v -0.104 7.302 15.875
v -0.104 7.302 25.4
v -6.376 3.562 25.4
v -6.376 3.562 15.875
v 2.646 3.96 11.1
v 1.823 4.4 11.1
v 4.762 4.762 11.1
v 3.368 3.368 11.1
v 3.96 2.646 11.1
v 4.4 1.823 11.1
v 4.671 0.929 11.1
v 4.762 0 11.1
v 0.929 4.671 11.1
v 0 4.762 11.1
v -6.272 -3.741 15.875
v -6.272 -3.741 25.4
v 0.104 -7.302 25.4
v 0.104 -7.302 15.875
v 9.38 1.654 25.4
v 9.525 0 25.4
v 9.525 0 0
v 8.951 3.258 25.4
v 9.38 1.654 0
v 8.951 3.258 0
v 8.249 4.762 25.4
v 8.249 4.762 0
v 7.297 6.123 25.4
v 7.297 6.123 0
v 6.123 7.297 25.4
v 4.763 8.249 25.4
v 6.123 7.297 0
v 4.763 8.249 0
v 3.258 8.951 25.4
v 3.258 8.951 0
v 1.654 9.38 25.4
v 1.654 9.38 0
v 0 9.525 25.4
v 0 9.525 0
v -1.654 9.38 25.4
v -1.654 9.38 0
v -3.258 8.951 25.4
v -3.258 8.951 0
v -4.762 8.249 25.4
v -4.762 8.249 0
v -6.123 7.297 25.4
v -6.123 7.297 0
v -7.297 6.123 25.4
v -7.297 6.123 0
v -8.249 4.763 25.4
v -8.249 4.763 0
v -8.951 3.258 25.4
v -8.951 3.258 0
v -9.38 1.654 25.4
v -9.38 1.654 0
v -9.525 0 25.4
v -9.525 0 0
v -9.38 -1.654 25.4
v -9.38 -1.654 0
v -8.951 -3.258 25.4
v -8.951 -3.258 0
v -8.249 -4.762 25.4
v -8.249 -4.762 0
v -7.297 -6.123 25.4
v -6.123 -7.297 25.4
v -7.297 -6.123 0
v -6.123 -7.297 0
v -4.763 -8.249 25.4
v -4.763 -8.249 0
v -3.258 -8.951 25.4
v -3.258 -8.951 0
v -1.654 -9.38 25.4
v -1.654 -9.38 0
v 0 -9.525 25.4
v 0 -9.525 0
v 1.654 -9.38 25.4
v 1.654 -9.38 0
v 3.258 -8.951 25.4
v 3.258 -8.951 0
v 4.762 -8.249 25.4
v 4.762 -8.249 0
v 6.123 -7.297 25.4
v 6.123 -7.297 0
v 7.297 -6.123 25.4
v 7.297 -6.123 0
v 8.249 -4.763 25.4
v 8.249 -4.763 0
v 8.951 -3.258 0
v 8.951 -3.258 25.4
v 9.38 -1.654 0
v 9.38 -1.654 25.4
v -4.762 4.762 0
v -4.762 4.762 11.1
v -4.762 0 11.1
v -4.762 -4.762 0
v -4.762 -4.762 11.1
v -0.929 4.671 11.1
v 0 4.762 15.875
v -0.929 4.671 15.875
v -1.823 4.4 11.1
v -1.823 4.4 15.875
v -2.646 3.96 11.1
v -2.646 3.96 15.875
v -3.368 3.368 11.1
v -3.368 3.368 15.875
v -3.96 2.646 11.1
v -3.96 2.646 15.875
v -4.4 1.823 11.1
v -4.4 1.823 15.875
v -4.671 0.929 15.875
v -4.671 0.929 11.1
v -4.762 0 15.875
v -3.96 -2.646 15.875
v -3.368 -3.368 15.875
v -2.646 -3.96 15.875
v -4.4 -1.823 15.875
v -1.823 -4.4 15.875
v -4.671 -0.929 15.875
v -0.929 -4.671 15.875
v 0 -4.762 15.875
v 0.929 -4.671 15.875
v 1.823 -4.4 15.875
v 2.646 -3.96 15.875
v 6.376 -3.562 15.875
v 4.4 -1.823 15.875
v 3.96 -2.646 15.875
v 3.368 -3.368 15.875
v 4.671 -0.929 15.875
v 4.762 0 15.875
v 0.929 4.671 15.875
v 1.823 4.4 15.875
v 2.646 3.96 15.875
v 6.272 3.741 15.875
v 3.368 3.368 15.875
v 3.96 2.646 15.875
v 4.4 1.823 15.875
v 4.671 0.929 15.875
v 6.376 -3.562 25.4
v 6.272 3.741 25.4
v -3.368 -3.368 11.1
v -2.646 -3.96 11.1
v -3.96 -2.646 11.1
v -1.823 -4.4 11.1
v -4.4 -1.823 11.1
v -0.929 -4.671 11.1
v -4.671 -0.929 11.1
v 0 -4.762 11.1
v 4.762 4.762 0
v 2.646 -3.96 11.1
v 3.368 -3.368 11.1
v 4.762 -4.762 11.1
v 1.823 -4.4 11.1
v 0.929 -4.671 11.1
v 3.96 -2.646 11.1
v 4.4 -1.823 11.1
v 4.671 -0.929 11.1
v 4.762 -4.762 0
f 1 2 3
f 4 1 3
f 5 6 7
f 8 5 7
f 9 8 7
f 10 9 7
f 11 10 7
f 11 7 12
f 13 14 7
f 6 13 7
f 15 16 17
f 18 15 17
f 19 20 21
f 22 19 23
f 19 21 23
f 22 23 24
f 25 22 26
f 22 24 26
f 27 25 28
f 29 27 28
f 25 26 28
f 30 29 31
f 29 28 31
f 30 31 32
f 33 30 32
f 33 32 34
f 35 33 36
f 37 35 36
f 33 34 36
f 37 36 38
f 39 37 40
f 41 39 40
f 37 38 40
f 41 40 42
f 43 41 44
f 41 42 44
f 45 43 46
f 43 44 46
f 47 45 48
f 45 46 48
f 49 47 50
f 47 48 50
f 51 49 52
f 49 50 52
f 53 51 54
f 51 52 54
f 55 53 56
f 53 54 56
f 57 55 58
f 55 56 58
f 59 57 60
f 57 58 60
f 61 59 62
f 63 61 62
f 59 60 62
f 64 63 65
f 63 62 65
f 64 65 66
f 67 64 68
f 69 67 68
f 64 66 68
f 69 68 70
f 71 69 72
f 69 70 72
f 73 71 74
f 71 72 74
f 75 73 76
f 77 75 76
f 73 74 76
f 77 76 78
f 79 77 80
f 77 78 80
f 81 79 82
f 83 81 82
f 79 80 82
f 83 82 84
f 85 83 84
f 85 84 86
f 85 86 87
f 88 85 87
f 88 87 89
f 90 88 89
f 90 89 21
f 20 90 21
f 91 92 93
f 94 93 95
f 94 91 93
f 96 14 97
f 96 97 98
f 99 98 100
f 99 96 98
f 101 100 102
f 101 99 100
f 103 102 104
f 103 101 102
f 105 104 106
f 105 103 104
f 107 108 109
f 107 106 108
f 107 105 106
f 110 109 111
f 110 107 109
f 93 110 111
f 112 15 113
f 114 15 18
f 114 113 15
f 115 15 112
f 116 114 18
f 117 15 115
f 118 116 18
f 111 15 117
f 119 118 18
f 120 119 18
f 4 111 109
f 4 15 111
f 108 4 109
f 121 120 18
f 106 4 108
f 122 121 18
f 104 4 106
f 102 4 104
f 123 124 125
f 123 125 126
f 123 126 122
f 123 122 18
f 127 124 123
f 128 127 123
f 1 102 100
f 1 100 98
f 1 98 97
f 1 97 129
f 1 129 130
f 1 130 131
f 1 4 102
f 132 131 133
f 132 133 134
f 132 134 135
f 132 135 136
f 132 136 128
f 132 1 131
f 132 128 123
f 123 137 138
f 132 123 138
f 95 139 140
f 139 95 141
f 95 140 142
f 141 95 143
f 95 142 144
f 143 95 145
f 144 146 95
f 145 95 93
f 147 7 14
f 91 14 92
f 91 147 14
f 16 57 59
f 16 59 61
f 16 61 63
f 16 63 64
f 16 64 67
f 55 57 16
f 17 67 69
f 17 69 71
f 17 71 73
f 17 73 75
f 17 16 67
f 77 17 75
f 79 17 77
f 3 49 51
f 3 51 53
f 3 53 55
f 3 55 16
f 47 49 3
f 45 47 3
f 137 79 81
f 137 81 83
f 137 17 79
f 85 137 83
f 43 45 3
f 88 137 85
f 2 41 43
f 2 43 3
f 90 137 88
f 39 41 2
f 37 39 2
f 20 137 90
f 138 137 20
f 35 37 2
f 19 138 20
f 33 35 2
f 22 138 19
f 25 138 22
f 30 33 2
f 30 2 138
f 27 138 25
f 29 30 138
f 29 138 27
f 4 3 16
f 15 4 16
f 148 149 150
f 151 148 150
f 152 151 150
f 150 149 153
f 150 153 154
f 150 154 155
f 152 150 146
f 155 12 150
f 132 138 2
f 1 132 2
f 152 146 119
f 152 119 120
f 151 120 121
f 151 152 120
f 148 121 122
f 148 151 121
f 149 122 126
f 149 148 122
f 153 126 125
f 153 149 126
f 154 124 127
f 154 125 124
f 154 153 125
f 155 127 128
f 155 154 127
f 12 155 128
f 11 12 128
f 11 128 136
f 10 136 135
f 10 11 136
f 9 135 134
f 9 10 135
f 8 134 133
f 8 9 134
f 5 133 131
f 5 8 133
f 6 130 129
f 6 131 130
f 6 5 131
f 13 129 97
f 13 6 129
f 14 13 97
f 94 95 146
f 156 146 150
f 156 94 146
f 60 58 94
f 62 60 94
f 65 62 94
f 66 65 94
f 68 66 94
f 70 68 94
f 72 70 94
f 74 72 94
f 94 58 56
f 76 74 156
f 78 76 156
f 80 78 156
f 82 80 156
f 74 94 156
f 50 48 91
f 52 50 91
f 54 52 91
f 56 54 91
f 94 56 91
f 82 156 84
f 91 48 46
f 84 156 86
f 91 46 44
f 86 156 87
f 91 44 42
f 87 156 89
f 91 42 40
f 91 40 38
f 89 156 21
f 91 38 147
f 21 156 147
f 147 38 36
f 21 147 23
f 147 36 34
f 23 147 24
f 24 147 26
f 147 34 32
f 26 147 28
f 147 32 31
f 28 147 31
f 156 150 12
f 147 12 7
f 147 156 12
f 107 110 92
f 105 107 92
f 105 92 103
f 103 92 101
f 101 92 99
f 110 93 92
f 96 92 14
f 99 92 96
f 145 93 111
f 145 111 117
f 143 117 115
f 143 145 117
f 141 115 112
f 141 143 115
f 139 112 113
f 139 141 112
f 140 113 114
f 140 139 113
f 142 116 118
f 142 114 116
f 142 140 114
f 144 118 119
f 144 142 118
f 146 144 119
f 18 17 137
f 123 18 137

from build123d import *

# Parameters (mm, degrees)
F0_R     = 9.525
F1_DEPTH = 25.4
F3_DEPTH = 25.401
F4_DEPTH = 11.0998
F6_DEPTH = 9.525


with BuildPart() as f1:
    # F0 (on Top) → F1 (new body)
    with BuildSketch(Plane.XY):
        Circle(F0_R)
    extrude(amount=F1_DEPTH)

    # F2 (on Top) → F3 (cut, through all)
    with BuildSketch(Plane.XY):
        with BuildLine():
            ThreePointArc((-4.7625, 0), (-3.367596, -3.367596), (0, -4.7625))
            ThreePointArc((0, -4.7625), (3.367596, -3.367596), (4.7625, 0))
            ThreePointArc((4.7625, 0), (3.367596, 3.367596), (0, 4.7625))
            ThreePointArc((0, 4.7625), (-3.367596, 3.367596), (-4.7625, 0))
        make_face()
    extrude(amount=F3_DEPTH, mode=Mode.SUBTRACT)

    # F2 (on Top) → F4 (cut)
    with BuildSketch(Plane.XY):
        with BuildLine():
            Line((0, -4.7625), (4.7625, -4.7625))
            Line((4.7625, -4.7625), (4.7625, 0))
            ThreePointArc((4.7625, 0), (3.367596, -3.367596), (0, -4.7625))
        make_face()
        with BuildLine():
            Line((-4.7625, -4.7625), (0, -4.7625))
            ThreePointArc((0, -4.7625), (-3.367596, -3.367596), (-4.7625, 0))
            Line((-4.7625, 0), (-4.7625, -4.7625))
        make_face()
        with BuildLine():
            ThreePointArc((0, 4.7625), (3.367596, 3.367596), (4.7625, 0))
            Line((4.7625, 0), (4.7625, 4.7625))
            Line((4.7625, 4.7625), (0, 4.7625))
        make_face()
        with BuildLine():
            Line((-4.7625, 4.7625), (-4.7625, 0))
            ThreePointArc((-4.7625, 0), (-3.367596, 3.367596), (0, 4.7625))
            Line((0, 4.7625), (-4.7625, 4.7625))
        make_face()
    extrude(amount=F4_DEPTH, mode=Mode.SUBTRACT)

    # F5 (on face) → F6 (cut)
    with BuildSketch(Plane.XY.offset(25.4)):
        Polygon((0.103503, -7.3025), (6.375902, -3.561614), (6.272399, 3.740886), (-0.103503, 7.3025), (-6.375902, 3.561614), (-6.272399, -3.740886), align=None)
    extrude(amount=-F6_DEPTH, mode=Mode.SUBTRACT)


solid = f1.part
